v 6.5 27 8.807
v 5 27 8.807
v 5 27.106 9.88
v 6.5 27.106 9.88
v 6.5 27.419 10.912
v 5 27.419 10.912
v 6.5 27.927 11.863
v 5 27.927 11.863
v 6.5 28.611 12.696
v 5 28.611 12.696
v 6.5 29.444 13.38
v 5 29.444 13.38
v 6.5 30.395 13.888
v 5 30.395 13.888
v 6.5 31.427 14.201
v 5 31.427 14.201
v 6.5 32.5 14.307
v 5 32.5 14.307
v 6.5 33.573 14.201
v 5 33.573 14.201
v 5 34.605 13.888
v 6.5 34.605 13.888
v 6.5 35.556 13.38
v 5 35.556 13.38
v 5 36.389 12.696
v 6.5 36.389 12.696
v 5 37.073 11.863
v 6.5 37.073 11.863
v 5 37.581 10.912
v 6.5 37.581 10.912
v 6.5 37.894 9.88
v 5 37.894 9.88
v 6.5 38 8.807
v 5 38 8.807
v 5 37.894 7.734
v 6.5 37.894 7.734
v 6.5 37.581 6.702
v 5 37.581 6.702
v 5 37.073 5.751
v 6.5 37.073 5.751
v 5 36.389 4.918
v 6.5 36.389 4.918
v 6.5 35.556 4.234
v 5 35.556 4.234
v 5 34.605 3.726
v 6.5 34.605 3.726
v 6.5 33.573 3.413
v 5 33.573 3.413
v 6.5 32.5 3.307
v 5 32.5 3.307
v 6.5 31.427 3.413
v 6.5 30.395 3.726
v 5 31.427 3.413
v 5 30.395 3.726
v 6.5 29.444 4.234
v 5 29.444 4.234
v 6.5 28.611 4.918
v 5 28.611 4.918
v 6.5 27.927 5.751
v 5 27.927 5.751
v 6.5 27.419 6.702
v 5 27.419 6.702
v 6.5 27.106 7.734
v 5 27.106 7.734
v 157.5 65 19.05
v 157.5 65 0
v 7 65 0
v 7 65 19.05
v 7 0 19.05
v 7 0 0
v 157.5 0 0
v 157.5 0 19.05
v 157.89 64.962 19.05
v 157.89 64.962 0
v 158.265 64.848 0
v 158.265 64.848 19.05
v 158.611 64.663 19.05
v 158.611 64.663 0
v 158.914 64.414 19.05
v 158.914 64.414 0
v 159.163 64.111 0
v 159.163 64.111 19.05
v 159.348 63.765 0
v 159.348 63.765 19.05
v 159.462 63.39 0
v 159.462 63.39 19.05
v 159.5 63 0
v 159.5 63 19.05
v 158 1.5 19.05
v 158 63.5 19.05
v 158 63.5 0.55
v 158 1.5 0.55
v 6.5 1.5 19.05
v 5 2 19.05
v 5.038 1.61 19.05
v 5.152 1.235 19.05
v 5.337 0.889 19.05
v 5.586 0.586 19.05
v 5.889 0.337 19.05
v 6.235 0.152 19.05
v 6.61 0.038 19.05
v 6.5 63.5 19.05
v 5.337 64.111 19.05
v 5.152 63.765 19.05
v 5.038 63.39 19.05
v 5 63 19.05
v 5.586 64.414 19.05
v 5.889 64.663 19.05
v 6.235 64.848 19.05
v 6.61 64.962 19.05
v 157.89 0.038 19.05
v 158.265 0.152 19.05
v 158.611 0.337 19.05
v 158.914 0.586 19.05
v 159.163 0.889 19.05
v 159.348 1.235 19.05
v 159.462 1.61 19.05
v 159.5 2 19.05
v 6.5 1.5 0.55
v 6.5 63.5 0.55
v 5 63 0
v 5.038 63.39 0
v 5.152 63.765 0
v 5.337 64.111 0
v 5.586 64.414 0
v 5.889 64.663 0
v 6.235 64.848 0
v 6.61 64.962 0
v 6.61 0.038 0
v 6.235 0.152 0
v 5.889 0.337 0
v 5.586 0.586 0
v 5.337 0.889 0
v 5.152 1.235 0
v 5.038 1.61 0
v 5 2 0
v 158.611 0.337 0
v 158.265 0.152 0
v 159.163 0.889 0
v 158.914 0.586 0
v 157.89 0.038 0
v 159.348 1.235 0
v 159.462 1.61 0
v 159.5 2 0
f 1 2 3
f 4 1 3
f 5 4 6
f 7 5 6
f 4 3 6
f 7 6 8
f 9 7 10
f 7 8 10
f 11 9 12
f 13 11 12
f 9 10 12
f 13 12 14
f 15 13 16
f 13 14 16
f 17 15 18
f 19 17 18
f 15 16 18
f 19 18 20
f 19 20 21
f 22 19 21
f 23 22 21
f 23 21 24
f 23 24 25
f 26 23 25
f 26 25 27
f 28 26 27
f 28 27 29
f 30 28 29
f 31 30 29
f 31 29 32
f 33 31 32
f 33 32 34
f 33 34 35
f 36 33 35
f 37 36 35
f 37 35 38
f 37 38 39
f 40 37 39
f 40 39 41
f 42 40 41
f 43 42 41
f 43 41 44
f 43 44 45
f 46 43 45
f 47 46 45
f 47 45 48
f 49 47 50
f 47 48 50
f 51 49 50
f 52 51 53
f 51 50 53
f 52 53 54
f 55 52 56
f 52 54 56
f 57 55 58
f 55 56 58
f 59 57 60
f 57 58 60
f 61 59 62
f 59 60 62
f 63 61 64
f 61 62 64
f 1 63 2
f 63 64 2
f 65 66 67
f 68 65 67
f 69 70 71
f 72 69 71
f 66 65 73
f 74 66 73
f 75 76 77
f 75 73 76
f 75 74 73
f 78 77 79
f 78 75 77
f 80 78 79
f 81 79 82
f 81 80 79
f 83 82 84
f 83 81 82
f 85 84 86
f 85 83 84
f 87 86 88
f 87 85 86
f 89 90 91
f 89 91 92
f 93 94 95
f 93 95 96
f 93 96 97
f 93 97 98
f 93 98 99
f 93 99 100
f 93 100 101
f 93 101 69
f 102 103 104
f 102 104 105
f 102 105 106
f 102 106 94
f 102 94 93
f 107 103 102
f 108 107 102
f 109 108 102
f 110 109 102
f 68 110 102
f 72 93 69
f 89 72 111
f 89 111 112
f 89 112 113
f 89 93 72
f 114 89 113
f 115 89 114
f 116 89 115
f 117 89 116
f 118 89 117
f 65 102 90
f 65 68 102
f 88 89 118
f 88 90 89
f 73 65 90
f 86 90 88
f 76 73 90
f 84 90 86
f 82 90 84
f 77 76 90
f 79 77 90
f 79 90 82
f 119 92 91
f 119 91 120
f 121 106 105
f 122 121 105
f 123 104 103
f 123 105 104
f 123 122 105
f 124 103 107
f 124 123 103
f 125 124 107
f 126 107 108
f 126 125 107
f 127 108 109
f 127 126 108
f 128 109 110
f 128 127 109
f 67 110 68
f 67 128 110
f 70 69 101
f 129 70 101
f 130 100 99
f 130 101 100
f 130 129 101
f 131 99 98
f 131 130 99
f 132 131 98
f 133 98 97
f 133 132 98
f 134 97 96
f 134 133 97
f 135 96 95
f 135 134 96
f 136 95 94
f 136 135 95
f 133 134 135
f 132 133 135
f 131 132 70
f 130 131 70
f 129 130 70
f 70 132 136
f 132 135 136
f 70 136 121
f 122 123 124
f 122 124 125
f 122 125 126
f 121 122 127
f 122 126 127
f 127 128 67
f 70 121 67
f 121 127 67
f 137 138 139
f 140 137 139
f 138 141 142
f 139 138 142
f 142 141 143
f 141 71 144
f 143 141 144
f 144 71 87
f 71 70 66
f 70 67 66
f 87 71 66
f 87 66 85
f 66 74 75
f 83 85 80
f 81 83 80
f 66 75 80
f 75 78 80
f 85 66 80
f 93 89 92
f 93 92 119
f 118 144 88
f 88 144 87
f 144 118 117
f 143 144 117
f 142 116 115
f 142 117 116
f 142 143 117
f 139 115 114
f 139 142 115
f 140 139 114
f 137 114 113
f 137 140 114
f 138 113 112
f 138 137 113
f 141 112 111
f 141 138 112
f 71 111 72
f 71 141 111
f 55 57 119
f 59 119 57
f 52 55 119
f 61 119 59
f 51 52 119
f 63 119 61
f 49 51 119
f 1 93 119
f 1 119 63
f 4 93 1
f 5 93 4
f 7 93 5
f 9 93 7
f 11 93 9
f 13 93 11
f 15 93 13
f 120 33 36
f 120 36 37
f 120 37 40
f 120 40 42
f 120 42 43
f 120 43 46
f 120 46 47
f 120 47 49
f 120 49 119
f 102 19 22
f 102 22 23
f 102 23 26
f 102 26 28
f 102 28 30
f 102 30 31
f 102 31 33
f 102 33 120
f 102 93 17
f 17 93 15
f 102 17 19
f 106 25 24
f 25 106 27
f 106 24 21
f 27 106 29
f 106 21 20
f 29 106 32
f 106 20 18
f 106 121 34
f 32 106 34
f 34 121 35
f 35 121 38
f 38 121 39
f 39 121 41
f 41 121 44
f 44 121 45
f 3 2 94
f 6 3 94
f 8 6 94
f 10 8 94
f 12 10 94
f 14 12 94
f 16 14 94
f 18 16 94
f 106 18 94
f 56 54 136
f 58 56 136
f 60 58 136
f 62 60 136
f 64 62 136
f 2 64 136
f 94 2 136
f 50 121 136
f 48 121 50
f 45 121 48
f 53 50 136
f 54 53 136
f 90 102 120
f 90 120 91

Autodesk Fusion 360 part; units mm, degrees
sketch "Sketch3" plane through (0, 0, 0) normal (0, 0, 1) x (1, 0, 0)
  line L0 (7, 0) -> (157.5, 0)
  line L1 (159.5, 2) -> (159.5, 63)
  line L2 (157.5, 65) -> (7, 65)
  line L3 (5, 63) -> (5, 2)
  arc A0 (7, 65) -> (5, 63) centre (7, 63) ccw
  arc A1 (159.5, 63) -> (157.5, 65) centre (157.5, 63) ccw
  arc A2 (157.5, 0) -> (159.5, 2) centre (157.5, 2) ccw
  arc A3 (5, 2) -> (7, 0) centre (7, 2) ccw
  dimension "d12" = 65
  dimension "d13" = 2
  dimension "d14" = 2
  dimension "d15" = 2
  dimension "d16" = 2
  dimension "d30" = 150.5
extrude "Extrude2" add sketch "Sketch3" along normal blind 12.7
extrude "Extrude3" add 1 faces at (107.3333, 21.6667, 12.7) along direction (0, 0, 1) blind 6.35
sketch "Sketch5" plane through (0, 0, 19.05) normal (0, 0, 1) x (-1, 0, 0)
  arc A0 (-5, -2) -> (-7, 0) centre (-7, -2) ccw
  line L0 (-7, 0) -> (-157.5, 0)
  arc A1 (-157.5, 0) -> (-159.5, -2) centre (-157.5, -2) ccw
  line L1 (-159.5, -2) -> (-159.5, -63)
  arc A2 (-159.5, -63) -> (-157.5, -65) centre (-157.5, -63) ccw
  line L2 (-157.5, -65) -> (-7, -65)
  arc A3 (-7, -65) -> (-5, -63) centre (-7, -63) ccw
  line L3 (-5, -63) -> (-5, -2)
  line L4 (-6.5, -63.5) -> (-158, -63.5)
  line L5 (-158, -63.5) -> (-158, -1.5)
  line L6 (-158, -1.5) -> (-6.5, -1.5)
  line L7 (-6.5, -1.5) -> (-6.5, -63.5)
  line L8 (-158, -1.5) -> (-158, -63.5)
  dimension "d26" = 1.5
  dimension "d27" = 1.5
  dimension "d28" = 1.5
  dimension "d29" = 1.5
extrude "Extrude4" cut sketch "Sketch5" against normal blind 10 contours L4 L5 L6 L7 L8
sketch "Sketch6" plane through (5, 0, 0) normal (-1, 0, 0) x (0, -1, 0)
  line L0 (-63, 0) -> (-2, 0)
  line L1 (-2, 0) -> (-2, 19.05)
  line L2 (-2, 19.05) -> (-63, 19.05)
  line L3 (-63, 19.05) -> (-63, 0)
  circle A0 centre (-32.5, 8.8069) radius 5.5
  dimension "d33" = 11
  dimension "d34" = 30.5
extrude "Extrude5" cut 1 faces at (57, 42.8333, 9.05) along direction (0, 0, -1) blind 5.35
extrude "Extrude6" cut 1 faces at (57, 42.8333, 3.7) along direction (0, 0, -1) blind 3.15
extrude "Extrude7" cut sketch "Sketch6" against normal blind 5 contours A0
